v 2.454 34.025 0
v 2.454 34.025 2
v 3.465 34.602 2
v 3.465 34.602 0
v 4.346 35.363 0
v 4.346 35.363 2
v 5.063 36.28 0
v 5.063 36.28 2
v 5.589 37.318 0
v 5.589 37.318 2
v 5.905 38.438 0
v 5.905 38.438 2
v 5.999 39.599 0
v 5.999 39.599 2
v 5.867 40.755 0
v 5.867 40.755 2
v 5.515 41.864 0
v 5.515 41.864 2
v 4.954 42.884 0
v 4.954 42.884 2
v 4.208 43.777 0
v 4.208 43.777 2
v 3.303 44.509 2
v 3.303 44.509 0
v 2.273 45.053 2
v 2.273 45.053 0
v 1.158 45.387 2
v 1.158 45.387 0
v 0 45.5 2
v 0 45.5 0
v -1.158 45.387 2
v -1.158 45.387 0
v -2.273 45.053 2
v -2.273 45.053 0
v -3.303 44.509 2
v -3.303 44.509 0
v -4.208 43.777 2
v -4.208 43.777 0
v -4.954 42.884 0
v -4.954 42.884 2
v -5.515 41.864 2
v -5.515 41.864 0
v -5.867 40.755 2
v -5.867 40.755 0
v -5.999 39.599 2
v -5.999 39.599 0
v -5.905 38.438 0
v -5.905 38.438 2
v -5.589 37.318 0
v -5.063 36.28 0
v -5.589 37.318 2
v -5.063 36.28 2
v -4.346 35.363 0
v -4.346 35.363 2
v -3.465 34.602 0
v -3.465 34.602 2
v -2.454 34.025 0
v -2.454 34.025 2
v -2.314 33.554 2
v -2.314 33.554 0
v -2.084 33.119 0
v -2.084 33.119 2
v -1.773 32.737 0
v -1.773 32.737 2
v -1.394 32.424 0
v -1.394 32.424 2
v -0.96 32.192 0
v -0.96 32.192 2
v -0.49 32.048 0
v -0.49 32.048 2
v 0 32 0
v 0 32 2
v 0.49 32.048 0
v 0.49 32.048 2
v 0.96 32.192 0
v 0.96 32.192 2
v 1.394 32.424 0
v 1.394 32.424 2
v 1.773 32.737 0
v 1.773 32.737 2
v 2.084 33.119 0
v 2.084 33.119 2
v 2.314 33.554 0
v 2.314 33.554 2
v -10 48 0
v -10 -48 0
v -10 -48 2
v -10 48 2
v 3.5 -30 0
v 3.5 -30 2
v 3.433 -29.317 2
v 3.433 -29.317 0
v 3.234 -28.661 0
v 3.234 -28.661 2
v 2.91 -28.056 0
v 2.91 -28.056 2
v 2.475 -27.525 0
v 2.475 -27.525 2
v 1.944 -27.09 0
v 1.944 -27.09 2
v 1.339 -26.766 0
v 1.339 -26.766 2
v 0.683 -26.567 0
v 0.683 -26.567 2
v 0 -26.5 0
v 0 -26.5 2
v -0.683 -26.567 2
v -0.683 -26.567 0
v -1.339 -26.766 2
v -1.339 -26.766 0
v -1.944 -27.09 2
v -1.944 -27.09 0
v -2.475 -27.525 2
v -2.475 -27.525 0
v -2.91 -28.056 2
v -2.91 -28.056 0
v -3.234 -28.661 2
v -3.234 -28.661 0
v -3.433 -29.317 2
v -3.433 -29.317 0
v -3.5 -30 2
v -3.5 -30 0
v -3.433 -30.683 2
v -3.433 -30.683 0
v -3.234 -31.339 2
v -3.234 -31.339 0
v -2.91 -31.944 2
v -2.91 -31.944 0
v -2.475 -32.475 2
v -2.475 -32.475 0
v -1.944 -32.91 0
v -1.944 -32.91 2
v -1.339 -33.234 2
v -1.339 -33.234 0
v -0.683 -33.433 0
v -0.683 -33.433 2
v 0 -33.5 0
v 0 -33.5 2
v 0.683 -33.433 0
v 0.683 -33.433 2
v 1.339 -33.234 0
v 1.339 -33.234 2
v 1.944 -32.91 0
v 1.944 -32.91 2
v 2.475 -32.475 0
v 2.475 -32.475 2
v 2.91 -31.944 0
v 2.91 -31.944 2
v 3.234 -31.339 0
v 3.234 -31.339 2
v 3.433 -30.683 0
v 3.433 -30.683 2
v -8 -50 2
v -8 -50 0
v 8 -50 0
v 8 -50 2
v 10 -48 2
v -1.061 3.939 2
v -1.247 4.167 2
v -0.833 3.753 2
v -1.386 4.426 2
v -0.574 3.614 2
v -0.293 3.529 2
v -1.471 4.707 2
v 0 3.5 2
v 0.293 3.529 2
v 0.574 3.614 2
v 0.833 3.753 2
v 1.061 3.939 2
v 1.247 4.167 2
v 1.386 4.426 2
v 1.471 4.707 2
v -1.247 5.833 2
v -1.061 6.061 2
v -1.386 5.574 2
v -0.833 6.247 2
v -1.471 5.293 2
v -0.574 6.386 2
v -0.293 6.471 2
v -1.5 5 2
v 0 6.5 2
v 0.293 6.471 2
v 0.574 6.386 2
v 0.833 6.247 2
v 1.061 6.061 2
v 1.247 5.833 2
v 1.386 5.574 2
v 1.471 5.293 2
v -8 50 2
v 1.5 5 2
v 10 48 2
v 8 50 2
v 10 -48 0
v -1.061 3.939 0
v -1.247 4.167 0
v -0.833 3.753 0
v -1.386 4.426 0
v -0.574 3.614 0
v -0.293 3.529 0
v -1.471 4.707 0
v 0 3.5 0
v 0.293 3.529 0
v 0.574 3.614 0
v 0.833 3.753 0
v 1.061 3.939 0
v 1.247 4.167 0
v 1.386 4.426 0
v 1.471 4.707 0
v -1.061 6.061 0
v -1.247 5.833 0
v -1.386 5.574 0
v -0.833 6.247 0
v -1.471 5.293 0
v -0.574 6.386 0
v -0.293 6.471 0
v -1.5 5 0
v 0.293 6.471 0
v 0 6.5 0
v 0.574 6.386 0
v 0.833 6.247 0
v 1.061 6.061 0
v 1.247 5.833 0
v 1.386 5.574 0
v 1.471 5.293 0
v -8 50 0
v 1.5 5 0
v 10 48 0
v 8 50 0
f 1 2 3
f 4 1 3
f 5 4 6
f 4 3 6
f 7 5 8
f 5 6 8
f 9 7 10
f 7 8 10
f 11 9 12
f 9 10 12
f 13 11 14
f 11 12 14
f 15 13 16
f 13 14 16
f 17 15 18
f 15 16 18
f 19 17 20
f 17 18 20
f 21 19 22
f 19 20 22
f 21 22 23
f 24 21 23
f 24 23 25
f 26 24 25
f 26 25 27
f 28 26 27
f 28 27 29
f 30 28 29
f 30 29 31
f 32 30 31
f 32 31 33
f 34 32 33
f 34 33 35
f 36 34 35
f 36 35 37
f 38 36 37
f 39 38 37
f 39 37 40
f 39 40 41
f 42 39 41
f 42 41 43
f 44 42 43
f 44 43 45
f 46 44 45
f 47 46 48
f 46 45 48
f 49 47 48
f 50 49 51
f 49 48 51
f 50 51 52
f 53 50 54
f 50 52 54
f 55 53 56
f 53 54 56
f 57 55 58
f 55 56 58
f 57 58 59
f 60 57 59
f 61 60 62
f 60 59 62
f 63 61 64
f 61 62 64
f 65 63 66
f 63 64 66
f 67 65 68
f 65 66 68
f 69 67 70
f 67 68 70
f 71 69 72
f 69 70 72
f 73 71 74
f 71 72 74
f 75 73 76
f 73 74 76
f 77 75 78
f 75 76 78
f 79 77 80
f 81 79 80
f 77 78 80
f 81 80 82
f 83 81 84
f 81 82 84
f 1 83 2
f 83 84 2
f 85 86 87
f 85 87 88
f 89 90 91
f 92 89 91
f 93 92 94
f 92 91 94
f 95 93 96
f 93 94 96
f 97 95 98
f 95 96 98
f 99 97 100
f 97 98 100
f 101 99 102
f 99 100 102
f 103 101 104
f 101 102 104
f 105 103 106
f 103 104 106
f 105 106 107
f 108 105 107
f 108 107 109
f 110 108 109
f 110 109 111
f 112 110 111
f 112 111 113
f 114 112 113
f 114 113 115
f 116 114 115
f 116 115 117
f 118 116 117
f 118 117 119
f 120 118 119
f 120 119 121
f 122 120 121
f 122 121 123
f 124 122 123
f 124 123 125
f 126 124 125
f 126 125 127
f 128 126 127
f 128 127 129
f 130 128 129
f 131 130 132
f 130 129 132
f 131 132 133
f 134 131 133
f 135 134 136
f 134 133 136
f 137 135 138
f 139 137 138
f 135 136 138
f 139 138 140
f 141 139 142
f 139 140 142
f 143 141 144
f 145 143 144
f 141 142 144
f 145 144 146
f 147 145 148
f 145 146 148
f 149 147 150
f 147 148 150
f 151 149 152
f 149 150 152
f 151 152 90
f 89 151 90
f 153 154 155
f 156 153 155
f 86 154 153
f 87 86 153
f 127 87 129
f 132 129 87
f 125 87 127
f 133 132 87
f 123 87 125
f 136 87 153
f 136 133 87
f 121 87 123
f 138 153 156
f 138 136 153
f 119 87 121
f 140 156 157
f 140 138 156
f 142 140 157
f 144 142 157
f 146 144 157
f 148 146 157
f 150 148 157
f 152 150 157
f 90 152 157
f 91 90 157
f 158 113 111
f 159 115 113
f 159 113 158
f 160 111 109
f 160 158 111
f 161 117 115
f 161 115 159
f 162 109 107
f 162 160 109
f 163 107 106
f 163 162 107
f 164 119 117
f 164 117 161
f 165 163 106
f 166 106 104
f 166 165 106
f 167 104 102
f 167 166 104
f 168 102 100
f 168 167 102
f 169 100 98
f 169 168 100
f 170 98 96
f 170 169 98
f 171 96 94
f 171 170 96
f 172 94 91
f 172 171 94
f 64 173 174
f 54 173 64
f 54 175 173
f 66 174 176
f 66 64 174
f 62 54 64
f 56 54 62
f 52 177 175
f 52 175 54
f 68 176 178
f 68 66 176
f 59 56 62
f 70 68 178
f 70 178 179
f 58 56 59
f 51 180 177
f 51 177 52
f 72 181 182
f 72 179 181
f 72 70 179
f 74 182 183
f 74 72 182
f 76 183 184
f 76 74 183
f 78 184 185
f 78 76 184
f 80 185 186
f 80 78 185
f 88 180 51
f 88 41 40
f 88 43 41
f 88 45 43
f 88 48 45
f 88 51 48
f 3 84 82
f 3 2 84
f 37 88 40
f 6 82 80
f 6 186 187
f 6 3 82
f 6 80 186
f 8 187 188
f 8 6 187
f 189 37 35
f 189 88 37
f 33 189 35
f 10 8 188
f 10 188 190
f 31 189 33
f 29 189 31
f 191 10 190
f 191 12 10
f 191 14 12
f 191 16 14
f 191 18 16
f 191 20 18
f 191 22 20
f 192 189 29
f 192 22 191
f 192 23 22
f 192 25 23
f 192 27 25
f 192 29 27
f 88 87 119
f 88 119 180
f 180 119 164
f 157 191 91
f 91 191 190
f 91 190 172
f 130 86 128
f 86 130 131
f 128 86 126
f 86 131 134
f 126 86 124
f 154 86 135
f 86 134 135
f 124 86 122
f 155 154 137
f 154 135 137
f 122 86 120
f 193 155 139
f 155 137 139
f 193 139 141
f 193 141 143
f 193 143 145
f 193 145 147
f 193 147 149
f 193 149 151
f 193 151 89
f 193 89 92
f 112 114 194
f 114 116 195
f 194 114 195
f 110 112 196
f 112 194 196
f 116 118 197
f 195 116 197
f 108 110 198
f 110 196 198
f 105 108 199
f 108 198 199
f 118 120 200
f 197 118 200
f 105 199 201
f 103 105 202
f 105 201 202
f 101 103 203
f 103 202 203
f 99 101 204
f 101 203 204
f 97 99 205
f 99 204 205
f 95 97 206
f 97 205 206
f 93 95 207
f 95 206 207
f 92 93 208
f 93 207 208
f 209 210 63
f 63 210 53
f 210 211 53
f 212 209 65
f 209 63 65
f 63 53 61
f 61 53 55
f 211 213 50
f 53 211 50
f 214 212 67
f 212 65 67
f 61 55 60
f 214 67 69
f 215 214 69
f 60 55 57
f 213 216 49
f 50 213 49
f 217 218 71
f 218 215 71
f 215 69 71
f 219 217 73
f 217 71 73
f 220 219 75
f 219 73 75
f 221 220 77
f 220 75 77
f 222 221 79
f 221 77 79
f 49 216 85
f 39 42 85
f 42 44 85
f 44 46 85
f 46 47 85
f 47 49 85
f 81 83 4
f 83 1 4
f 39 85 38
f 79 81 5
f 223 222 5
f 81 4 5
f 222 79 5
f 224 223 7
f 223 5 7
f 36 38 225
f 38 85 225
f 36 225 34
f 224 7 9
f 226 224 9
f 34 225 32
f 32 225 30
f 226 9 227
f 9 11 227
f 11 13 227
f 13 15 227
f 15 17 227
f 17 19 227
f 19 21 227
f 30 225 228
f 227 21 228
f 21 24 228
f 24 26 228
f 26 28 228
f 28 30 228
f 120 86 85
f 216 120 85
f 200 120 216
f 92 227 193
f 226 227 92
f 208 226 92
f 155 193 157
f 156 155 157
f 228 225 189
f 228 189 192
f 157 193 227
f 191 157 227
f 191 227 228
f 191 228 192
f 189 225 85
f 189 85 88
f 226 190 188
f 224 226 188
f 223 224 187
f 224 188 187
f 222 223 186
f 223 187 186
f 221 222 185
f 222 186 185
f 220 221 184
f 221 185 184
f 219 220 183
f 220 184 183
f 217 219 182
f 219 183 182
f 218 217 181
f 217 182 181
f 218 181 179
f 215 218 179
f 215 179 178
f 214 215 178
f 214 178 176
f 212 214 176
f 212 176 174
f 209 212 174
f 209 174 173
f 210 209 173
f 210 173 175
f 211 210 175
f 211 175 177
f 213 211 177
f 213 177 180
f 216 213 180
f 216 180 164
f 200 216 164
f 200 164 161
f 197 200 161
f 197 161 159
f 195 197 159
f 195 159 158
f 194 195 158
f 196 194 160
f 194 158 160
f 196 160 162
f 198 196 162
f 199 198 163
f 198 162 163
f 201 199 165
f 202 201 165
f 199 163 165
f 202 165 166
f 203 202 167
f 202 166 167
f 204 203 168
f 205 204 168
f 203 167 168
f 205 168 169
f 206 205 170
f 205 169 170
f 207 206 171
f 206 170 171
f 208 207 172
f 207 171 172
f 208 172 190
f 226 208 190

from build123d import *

# Parameters (mm, degrees)
SKETCH1_W           = 20
SKETCH1_H           = 100
BOSS_EXTRUDE1_DEPTH = 2
CUT_EXTRUDE1_REACH  = 53.029
SKETCH2_R           = 1.5
SKETCH2_R_2         = 3.5
CHAMFER1_SIZE       = 2


with BuildPart() as part:
    # Sketch1 → Boss-Extrude1 (new body)
    with BuildSketch(Plane.XY):
        Rectangle(SKETCH1_W, SKETCH1_H)
    extrude(amount=BOSS_EXTRUDE1_DEPTH)

    # Sketch2 → Cut-Extrude1 (cut, up to next)
    with BuildSketch(Plane.XY.offset(2), mode=Mode.PRIVATE) as cut_extrude1_sk1:
        with Locations((0, 5)):
            Circle(SKETCH2_R)
    cut_extrude1_tool1 = extrude(cut_extrude1_sk1.sketch, amount=-CUT_EXTRUDE1_REACH, mode=Mode.PRIVATE) & part.part
    # Sketch2 → Cut-Extrude1 (cut, up to next)
    with BuildSketch(Plane.XY.offset(2), mode=Mode.PRIVATE) as cut_extrude1_sk2:
        with Locations((0, -30)):
            Circle(SKETCH2_R_2)
    cut_extrude1_tool2 = extrude(cut_extrude1_sk2.sketch, amount=-CUT_EXTRUDE1_REACH, mode=Mode.PRIVATE) & part.part
    # Sketch2 → Cut-Extrude1 (cut, up to next)
    with BuildSketch(Plane.XY.offset(2), mode=Mode.PRIVATE) as cut_extrude1_sk3:
        with BuildLine():
            ThreePointArc((2.454460226, 34.025), (0, 45.5), (-2.454460226, 34.025))
            ThreePointArc((-2.454460226, 34.025), (0, 32), (2.454460226, 34.025))
        make_face()
    cut_extrude1_tool3 = extrude(cut_extrude1_sk3.sketch, amount=-CUT_EXTRUDE1_REACH, mode=Mode.PRIVATE) & part.part
    add(cut_extrude1_tool1.solids().sort_by_distance((0, 5, 2))[0], mode=Mode.SUBTRACT)
    add(cut_extrude1_tool2.solids().sort_by_distance((0, -30, 2))[0], mode=Mode.SUBTRACT)
    add(cut_extrude1_tool3.solids().sort_by_distance((0, 39.186214, 2))[0], mode=Mode.SUBTRACT)

    # Chamfer1
    chamfer1_edges = [part.edges().sort_by_distance(p)[0] for p in [
        (10, -50, 1),
        (-10, -50, 1),
        (-10, 50, 1),
        (10, 50, 1),
    ]]
    chamfer(chamfer1_edges, length=CHAMFER1_SIZE)


solid = part.part
